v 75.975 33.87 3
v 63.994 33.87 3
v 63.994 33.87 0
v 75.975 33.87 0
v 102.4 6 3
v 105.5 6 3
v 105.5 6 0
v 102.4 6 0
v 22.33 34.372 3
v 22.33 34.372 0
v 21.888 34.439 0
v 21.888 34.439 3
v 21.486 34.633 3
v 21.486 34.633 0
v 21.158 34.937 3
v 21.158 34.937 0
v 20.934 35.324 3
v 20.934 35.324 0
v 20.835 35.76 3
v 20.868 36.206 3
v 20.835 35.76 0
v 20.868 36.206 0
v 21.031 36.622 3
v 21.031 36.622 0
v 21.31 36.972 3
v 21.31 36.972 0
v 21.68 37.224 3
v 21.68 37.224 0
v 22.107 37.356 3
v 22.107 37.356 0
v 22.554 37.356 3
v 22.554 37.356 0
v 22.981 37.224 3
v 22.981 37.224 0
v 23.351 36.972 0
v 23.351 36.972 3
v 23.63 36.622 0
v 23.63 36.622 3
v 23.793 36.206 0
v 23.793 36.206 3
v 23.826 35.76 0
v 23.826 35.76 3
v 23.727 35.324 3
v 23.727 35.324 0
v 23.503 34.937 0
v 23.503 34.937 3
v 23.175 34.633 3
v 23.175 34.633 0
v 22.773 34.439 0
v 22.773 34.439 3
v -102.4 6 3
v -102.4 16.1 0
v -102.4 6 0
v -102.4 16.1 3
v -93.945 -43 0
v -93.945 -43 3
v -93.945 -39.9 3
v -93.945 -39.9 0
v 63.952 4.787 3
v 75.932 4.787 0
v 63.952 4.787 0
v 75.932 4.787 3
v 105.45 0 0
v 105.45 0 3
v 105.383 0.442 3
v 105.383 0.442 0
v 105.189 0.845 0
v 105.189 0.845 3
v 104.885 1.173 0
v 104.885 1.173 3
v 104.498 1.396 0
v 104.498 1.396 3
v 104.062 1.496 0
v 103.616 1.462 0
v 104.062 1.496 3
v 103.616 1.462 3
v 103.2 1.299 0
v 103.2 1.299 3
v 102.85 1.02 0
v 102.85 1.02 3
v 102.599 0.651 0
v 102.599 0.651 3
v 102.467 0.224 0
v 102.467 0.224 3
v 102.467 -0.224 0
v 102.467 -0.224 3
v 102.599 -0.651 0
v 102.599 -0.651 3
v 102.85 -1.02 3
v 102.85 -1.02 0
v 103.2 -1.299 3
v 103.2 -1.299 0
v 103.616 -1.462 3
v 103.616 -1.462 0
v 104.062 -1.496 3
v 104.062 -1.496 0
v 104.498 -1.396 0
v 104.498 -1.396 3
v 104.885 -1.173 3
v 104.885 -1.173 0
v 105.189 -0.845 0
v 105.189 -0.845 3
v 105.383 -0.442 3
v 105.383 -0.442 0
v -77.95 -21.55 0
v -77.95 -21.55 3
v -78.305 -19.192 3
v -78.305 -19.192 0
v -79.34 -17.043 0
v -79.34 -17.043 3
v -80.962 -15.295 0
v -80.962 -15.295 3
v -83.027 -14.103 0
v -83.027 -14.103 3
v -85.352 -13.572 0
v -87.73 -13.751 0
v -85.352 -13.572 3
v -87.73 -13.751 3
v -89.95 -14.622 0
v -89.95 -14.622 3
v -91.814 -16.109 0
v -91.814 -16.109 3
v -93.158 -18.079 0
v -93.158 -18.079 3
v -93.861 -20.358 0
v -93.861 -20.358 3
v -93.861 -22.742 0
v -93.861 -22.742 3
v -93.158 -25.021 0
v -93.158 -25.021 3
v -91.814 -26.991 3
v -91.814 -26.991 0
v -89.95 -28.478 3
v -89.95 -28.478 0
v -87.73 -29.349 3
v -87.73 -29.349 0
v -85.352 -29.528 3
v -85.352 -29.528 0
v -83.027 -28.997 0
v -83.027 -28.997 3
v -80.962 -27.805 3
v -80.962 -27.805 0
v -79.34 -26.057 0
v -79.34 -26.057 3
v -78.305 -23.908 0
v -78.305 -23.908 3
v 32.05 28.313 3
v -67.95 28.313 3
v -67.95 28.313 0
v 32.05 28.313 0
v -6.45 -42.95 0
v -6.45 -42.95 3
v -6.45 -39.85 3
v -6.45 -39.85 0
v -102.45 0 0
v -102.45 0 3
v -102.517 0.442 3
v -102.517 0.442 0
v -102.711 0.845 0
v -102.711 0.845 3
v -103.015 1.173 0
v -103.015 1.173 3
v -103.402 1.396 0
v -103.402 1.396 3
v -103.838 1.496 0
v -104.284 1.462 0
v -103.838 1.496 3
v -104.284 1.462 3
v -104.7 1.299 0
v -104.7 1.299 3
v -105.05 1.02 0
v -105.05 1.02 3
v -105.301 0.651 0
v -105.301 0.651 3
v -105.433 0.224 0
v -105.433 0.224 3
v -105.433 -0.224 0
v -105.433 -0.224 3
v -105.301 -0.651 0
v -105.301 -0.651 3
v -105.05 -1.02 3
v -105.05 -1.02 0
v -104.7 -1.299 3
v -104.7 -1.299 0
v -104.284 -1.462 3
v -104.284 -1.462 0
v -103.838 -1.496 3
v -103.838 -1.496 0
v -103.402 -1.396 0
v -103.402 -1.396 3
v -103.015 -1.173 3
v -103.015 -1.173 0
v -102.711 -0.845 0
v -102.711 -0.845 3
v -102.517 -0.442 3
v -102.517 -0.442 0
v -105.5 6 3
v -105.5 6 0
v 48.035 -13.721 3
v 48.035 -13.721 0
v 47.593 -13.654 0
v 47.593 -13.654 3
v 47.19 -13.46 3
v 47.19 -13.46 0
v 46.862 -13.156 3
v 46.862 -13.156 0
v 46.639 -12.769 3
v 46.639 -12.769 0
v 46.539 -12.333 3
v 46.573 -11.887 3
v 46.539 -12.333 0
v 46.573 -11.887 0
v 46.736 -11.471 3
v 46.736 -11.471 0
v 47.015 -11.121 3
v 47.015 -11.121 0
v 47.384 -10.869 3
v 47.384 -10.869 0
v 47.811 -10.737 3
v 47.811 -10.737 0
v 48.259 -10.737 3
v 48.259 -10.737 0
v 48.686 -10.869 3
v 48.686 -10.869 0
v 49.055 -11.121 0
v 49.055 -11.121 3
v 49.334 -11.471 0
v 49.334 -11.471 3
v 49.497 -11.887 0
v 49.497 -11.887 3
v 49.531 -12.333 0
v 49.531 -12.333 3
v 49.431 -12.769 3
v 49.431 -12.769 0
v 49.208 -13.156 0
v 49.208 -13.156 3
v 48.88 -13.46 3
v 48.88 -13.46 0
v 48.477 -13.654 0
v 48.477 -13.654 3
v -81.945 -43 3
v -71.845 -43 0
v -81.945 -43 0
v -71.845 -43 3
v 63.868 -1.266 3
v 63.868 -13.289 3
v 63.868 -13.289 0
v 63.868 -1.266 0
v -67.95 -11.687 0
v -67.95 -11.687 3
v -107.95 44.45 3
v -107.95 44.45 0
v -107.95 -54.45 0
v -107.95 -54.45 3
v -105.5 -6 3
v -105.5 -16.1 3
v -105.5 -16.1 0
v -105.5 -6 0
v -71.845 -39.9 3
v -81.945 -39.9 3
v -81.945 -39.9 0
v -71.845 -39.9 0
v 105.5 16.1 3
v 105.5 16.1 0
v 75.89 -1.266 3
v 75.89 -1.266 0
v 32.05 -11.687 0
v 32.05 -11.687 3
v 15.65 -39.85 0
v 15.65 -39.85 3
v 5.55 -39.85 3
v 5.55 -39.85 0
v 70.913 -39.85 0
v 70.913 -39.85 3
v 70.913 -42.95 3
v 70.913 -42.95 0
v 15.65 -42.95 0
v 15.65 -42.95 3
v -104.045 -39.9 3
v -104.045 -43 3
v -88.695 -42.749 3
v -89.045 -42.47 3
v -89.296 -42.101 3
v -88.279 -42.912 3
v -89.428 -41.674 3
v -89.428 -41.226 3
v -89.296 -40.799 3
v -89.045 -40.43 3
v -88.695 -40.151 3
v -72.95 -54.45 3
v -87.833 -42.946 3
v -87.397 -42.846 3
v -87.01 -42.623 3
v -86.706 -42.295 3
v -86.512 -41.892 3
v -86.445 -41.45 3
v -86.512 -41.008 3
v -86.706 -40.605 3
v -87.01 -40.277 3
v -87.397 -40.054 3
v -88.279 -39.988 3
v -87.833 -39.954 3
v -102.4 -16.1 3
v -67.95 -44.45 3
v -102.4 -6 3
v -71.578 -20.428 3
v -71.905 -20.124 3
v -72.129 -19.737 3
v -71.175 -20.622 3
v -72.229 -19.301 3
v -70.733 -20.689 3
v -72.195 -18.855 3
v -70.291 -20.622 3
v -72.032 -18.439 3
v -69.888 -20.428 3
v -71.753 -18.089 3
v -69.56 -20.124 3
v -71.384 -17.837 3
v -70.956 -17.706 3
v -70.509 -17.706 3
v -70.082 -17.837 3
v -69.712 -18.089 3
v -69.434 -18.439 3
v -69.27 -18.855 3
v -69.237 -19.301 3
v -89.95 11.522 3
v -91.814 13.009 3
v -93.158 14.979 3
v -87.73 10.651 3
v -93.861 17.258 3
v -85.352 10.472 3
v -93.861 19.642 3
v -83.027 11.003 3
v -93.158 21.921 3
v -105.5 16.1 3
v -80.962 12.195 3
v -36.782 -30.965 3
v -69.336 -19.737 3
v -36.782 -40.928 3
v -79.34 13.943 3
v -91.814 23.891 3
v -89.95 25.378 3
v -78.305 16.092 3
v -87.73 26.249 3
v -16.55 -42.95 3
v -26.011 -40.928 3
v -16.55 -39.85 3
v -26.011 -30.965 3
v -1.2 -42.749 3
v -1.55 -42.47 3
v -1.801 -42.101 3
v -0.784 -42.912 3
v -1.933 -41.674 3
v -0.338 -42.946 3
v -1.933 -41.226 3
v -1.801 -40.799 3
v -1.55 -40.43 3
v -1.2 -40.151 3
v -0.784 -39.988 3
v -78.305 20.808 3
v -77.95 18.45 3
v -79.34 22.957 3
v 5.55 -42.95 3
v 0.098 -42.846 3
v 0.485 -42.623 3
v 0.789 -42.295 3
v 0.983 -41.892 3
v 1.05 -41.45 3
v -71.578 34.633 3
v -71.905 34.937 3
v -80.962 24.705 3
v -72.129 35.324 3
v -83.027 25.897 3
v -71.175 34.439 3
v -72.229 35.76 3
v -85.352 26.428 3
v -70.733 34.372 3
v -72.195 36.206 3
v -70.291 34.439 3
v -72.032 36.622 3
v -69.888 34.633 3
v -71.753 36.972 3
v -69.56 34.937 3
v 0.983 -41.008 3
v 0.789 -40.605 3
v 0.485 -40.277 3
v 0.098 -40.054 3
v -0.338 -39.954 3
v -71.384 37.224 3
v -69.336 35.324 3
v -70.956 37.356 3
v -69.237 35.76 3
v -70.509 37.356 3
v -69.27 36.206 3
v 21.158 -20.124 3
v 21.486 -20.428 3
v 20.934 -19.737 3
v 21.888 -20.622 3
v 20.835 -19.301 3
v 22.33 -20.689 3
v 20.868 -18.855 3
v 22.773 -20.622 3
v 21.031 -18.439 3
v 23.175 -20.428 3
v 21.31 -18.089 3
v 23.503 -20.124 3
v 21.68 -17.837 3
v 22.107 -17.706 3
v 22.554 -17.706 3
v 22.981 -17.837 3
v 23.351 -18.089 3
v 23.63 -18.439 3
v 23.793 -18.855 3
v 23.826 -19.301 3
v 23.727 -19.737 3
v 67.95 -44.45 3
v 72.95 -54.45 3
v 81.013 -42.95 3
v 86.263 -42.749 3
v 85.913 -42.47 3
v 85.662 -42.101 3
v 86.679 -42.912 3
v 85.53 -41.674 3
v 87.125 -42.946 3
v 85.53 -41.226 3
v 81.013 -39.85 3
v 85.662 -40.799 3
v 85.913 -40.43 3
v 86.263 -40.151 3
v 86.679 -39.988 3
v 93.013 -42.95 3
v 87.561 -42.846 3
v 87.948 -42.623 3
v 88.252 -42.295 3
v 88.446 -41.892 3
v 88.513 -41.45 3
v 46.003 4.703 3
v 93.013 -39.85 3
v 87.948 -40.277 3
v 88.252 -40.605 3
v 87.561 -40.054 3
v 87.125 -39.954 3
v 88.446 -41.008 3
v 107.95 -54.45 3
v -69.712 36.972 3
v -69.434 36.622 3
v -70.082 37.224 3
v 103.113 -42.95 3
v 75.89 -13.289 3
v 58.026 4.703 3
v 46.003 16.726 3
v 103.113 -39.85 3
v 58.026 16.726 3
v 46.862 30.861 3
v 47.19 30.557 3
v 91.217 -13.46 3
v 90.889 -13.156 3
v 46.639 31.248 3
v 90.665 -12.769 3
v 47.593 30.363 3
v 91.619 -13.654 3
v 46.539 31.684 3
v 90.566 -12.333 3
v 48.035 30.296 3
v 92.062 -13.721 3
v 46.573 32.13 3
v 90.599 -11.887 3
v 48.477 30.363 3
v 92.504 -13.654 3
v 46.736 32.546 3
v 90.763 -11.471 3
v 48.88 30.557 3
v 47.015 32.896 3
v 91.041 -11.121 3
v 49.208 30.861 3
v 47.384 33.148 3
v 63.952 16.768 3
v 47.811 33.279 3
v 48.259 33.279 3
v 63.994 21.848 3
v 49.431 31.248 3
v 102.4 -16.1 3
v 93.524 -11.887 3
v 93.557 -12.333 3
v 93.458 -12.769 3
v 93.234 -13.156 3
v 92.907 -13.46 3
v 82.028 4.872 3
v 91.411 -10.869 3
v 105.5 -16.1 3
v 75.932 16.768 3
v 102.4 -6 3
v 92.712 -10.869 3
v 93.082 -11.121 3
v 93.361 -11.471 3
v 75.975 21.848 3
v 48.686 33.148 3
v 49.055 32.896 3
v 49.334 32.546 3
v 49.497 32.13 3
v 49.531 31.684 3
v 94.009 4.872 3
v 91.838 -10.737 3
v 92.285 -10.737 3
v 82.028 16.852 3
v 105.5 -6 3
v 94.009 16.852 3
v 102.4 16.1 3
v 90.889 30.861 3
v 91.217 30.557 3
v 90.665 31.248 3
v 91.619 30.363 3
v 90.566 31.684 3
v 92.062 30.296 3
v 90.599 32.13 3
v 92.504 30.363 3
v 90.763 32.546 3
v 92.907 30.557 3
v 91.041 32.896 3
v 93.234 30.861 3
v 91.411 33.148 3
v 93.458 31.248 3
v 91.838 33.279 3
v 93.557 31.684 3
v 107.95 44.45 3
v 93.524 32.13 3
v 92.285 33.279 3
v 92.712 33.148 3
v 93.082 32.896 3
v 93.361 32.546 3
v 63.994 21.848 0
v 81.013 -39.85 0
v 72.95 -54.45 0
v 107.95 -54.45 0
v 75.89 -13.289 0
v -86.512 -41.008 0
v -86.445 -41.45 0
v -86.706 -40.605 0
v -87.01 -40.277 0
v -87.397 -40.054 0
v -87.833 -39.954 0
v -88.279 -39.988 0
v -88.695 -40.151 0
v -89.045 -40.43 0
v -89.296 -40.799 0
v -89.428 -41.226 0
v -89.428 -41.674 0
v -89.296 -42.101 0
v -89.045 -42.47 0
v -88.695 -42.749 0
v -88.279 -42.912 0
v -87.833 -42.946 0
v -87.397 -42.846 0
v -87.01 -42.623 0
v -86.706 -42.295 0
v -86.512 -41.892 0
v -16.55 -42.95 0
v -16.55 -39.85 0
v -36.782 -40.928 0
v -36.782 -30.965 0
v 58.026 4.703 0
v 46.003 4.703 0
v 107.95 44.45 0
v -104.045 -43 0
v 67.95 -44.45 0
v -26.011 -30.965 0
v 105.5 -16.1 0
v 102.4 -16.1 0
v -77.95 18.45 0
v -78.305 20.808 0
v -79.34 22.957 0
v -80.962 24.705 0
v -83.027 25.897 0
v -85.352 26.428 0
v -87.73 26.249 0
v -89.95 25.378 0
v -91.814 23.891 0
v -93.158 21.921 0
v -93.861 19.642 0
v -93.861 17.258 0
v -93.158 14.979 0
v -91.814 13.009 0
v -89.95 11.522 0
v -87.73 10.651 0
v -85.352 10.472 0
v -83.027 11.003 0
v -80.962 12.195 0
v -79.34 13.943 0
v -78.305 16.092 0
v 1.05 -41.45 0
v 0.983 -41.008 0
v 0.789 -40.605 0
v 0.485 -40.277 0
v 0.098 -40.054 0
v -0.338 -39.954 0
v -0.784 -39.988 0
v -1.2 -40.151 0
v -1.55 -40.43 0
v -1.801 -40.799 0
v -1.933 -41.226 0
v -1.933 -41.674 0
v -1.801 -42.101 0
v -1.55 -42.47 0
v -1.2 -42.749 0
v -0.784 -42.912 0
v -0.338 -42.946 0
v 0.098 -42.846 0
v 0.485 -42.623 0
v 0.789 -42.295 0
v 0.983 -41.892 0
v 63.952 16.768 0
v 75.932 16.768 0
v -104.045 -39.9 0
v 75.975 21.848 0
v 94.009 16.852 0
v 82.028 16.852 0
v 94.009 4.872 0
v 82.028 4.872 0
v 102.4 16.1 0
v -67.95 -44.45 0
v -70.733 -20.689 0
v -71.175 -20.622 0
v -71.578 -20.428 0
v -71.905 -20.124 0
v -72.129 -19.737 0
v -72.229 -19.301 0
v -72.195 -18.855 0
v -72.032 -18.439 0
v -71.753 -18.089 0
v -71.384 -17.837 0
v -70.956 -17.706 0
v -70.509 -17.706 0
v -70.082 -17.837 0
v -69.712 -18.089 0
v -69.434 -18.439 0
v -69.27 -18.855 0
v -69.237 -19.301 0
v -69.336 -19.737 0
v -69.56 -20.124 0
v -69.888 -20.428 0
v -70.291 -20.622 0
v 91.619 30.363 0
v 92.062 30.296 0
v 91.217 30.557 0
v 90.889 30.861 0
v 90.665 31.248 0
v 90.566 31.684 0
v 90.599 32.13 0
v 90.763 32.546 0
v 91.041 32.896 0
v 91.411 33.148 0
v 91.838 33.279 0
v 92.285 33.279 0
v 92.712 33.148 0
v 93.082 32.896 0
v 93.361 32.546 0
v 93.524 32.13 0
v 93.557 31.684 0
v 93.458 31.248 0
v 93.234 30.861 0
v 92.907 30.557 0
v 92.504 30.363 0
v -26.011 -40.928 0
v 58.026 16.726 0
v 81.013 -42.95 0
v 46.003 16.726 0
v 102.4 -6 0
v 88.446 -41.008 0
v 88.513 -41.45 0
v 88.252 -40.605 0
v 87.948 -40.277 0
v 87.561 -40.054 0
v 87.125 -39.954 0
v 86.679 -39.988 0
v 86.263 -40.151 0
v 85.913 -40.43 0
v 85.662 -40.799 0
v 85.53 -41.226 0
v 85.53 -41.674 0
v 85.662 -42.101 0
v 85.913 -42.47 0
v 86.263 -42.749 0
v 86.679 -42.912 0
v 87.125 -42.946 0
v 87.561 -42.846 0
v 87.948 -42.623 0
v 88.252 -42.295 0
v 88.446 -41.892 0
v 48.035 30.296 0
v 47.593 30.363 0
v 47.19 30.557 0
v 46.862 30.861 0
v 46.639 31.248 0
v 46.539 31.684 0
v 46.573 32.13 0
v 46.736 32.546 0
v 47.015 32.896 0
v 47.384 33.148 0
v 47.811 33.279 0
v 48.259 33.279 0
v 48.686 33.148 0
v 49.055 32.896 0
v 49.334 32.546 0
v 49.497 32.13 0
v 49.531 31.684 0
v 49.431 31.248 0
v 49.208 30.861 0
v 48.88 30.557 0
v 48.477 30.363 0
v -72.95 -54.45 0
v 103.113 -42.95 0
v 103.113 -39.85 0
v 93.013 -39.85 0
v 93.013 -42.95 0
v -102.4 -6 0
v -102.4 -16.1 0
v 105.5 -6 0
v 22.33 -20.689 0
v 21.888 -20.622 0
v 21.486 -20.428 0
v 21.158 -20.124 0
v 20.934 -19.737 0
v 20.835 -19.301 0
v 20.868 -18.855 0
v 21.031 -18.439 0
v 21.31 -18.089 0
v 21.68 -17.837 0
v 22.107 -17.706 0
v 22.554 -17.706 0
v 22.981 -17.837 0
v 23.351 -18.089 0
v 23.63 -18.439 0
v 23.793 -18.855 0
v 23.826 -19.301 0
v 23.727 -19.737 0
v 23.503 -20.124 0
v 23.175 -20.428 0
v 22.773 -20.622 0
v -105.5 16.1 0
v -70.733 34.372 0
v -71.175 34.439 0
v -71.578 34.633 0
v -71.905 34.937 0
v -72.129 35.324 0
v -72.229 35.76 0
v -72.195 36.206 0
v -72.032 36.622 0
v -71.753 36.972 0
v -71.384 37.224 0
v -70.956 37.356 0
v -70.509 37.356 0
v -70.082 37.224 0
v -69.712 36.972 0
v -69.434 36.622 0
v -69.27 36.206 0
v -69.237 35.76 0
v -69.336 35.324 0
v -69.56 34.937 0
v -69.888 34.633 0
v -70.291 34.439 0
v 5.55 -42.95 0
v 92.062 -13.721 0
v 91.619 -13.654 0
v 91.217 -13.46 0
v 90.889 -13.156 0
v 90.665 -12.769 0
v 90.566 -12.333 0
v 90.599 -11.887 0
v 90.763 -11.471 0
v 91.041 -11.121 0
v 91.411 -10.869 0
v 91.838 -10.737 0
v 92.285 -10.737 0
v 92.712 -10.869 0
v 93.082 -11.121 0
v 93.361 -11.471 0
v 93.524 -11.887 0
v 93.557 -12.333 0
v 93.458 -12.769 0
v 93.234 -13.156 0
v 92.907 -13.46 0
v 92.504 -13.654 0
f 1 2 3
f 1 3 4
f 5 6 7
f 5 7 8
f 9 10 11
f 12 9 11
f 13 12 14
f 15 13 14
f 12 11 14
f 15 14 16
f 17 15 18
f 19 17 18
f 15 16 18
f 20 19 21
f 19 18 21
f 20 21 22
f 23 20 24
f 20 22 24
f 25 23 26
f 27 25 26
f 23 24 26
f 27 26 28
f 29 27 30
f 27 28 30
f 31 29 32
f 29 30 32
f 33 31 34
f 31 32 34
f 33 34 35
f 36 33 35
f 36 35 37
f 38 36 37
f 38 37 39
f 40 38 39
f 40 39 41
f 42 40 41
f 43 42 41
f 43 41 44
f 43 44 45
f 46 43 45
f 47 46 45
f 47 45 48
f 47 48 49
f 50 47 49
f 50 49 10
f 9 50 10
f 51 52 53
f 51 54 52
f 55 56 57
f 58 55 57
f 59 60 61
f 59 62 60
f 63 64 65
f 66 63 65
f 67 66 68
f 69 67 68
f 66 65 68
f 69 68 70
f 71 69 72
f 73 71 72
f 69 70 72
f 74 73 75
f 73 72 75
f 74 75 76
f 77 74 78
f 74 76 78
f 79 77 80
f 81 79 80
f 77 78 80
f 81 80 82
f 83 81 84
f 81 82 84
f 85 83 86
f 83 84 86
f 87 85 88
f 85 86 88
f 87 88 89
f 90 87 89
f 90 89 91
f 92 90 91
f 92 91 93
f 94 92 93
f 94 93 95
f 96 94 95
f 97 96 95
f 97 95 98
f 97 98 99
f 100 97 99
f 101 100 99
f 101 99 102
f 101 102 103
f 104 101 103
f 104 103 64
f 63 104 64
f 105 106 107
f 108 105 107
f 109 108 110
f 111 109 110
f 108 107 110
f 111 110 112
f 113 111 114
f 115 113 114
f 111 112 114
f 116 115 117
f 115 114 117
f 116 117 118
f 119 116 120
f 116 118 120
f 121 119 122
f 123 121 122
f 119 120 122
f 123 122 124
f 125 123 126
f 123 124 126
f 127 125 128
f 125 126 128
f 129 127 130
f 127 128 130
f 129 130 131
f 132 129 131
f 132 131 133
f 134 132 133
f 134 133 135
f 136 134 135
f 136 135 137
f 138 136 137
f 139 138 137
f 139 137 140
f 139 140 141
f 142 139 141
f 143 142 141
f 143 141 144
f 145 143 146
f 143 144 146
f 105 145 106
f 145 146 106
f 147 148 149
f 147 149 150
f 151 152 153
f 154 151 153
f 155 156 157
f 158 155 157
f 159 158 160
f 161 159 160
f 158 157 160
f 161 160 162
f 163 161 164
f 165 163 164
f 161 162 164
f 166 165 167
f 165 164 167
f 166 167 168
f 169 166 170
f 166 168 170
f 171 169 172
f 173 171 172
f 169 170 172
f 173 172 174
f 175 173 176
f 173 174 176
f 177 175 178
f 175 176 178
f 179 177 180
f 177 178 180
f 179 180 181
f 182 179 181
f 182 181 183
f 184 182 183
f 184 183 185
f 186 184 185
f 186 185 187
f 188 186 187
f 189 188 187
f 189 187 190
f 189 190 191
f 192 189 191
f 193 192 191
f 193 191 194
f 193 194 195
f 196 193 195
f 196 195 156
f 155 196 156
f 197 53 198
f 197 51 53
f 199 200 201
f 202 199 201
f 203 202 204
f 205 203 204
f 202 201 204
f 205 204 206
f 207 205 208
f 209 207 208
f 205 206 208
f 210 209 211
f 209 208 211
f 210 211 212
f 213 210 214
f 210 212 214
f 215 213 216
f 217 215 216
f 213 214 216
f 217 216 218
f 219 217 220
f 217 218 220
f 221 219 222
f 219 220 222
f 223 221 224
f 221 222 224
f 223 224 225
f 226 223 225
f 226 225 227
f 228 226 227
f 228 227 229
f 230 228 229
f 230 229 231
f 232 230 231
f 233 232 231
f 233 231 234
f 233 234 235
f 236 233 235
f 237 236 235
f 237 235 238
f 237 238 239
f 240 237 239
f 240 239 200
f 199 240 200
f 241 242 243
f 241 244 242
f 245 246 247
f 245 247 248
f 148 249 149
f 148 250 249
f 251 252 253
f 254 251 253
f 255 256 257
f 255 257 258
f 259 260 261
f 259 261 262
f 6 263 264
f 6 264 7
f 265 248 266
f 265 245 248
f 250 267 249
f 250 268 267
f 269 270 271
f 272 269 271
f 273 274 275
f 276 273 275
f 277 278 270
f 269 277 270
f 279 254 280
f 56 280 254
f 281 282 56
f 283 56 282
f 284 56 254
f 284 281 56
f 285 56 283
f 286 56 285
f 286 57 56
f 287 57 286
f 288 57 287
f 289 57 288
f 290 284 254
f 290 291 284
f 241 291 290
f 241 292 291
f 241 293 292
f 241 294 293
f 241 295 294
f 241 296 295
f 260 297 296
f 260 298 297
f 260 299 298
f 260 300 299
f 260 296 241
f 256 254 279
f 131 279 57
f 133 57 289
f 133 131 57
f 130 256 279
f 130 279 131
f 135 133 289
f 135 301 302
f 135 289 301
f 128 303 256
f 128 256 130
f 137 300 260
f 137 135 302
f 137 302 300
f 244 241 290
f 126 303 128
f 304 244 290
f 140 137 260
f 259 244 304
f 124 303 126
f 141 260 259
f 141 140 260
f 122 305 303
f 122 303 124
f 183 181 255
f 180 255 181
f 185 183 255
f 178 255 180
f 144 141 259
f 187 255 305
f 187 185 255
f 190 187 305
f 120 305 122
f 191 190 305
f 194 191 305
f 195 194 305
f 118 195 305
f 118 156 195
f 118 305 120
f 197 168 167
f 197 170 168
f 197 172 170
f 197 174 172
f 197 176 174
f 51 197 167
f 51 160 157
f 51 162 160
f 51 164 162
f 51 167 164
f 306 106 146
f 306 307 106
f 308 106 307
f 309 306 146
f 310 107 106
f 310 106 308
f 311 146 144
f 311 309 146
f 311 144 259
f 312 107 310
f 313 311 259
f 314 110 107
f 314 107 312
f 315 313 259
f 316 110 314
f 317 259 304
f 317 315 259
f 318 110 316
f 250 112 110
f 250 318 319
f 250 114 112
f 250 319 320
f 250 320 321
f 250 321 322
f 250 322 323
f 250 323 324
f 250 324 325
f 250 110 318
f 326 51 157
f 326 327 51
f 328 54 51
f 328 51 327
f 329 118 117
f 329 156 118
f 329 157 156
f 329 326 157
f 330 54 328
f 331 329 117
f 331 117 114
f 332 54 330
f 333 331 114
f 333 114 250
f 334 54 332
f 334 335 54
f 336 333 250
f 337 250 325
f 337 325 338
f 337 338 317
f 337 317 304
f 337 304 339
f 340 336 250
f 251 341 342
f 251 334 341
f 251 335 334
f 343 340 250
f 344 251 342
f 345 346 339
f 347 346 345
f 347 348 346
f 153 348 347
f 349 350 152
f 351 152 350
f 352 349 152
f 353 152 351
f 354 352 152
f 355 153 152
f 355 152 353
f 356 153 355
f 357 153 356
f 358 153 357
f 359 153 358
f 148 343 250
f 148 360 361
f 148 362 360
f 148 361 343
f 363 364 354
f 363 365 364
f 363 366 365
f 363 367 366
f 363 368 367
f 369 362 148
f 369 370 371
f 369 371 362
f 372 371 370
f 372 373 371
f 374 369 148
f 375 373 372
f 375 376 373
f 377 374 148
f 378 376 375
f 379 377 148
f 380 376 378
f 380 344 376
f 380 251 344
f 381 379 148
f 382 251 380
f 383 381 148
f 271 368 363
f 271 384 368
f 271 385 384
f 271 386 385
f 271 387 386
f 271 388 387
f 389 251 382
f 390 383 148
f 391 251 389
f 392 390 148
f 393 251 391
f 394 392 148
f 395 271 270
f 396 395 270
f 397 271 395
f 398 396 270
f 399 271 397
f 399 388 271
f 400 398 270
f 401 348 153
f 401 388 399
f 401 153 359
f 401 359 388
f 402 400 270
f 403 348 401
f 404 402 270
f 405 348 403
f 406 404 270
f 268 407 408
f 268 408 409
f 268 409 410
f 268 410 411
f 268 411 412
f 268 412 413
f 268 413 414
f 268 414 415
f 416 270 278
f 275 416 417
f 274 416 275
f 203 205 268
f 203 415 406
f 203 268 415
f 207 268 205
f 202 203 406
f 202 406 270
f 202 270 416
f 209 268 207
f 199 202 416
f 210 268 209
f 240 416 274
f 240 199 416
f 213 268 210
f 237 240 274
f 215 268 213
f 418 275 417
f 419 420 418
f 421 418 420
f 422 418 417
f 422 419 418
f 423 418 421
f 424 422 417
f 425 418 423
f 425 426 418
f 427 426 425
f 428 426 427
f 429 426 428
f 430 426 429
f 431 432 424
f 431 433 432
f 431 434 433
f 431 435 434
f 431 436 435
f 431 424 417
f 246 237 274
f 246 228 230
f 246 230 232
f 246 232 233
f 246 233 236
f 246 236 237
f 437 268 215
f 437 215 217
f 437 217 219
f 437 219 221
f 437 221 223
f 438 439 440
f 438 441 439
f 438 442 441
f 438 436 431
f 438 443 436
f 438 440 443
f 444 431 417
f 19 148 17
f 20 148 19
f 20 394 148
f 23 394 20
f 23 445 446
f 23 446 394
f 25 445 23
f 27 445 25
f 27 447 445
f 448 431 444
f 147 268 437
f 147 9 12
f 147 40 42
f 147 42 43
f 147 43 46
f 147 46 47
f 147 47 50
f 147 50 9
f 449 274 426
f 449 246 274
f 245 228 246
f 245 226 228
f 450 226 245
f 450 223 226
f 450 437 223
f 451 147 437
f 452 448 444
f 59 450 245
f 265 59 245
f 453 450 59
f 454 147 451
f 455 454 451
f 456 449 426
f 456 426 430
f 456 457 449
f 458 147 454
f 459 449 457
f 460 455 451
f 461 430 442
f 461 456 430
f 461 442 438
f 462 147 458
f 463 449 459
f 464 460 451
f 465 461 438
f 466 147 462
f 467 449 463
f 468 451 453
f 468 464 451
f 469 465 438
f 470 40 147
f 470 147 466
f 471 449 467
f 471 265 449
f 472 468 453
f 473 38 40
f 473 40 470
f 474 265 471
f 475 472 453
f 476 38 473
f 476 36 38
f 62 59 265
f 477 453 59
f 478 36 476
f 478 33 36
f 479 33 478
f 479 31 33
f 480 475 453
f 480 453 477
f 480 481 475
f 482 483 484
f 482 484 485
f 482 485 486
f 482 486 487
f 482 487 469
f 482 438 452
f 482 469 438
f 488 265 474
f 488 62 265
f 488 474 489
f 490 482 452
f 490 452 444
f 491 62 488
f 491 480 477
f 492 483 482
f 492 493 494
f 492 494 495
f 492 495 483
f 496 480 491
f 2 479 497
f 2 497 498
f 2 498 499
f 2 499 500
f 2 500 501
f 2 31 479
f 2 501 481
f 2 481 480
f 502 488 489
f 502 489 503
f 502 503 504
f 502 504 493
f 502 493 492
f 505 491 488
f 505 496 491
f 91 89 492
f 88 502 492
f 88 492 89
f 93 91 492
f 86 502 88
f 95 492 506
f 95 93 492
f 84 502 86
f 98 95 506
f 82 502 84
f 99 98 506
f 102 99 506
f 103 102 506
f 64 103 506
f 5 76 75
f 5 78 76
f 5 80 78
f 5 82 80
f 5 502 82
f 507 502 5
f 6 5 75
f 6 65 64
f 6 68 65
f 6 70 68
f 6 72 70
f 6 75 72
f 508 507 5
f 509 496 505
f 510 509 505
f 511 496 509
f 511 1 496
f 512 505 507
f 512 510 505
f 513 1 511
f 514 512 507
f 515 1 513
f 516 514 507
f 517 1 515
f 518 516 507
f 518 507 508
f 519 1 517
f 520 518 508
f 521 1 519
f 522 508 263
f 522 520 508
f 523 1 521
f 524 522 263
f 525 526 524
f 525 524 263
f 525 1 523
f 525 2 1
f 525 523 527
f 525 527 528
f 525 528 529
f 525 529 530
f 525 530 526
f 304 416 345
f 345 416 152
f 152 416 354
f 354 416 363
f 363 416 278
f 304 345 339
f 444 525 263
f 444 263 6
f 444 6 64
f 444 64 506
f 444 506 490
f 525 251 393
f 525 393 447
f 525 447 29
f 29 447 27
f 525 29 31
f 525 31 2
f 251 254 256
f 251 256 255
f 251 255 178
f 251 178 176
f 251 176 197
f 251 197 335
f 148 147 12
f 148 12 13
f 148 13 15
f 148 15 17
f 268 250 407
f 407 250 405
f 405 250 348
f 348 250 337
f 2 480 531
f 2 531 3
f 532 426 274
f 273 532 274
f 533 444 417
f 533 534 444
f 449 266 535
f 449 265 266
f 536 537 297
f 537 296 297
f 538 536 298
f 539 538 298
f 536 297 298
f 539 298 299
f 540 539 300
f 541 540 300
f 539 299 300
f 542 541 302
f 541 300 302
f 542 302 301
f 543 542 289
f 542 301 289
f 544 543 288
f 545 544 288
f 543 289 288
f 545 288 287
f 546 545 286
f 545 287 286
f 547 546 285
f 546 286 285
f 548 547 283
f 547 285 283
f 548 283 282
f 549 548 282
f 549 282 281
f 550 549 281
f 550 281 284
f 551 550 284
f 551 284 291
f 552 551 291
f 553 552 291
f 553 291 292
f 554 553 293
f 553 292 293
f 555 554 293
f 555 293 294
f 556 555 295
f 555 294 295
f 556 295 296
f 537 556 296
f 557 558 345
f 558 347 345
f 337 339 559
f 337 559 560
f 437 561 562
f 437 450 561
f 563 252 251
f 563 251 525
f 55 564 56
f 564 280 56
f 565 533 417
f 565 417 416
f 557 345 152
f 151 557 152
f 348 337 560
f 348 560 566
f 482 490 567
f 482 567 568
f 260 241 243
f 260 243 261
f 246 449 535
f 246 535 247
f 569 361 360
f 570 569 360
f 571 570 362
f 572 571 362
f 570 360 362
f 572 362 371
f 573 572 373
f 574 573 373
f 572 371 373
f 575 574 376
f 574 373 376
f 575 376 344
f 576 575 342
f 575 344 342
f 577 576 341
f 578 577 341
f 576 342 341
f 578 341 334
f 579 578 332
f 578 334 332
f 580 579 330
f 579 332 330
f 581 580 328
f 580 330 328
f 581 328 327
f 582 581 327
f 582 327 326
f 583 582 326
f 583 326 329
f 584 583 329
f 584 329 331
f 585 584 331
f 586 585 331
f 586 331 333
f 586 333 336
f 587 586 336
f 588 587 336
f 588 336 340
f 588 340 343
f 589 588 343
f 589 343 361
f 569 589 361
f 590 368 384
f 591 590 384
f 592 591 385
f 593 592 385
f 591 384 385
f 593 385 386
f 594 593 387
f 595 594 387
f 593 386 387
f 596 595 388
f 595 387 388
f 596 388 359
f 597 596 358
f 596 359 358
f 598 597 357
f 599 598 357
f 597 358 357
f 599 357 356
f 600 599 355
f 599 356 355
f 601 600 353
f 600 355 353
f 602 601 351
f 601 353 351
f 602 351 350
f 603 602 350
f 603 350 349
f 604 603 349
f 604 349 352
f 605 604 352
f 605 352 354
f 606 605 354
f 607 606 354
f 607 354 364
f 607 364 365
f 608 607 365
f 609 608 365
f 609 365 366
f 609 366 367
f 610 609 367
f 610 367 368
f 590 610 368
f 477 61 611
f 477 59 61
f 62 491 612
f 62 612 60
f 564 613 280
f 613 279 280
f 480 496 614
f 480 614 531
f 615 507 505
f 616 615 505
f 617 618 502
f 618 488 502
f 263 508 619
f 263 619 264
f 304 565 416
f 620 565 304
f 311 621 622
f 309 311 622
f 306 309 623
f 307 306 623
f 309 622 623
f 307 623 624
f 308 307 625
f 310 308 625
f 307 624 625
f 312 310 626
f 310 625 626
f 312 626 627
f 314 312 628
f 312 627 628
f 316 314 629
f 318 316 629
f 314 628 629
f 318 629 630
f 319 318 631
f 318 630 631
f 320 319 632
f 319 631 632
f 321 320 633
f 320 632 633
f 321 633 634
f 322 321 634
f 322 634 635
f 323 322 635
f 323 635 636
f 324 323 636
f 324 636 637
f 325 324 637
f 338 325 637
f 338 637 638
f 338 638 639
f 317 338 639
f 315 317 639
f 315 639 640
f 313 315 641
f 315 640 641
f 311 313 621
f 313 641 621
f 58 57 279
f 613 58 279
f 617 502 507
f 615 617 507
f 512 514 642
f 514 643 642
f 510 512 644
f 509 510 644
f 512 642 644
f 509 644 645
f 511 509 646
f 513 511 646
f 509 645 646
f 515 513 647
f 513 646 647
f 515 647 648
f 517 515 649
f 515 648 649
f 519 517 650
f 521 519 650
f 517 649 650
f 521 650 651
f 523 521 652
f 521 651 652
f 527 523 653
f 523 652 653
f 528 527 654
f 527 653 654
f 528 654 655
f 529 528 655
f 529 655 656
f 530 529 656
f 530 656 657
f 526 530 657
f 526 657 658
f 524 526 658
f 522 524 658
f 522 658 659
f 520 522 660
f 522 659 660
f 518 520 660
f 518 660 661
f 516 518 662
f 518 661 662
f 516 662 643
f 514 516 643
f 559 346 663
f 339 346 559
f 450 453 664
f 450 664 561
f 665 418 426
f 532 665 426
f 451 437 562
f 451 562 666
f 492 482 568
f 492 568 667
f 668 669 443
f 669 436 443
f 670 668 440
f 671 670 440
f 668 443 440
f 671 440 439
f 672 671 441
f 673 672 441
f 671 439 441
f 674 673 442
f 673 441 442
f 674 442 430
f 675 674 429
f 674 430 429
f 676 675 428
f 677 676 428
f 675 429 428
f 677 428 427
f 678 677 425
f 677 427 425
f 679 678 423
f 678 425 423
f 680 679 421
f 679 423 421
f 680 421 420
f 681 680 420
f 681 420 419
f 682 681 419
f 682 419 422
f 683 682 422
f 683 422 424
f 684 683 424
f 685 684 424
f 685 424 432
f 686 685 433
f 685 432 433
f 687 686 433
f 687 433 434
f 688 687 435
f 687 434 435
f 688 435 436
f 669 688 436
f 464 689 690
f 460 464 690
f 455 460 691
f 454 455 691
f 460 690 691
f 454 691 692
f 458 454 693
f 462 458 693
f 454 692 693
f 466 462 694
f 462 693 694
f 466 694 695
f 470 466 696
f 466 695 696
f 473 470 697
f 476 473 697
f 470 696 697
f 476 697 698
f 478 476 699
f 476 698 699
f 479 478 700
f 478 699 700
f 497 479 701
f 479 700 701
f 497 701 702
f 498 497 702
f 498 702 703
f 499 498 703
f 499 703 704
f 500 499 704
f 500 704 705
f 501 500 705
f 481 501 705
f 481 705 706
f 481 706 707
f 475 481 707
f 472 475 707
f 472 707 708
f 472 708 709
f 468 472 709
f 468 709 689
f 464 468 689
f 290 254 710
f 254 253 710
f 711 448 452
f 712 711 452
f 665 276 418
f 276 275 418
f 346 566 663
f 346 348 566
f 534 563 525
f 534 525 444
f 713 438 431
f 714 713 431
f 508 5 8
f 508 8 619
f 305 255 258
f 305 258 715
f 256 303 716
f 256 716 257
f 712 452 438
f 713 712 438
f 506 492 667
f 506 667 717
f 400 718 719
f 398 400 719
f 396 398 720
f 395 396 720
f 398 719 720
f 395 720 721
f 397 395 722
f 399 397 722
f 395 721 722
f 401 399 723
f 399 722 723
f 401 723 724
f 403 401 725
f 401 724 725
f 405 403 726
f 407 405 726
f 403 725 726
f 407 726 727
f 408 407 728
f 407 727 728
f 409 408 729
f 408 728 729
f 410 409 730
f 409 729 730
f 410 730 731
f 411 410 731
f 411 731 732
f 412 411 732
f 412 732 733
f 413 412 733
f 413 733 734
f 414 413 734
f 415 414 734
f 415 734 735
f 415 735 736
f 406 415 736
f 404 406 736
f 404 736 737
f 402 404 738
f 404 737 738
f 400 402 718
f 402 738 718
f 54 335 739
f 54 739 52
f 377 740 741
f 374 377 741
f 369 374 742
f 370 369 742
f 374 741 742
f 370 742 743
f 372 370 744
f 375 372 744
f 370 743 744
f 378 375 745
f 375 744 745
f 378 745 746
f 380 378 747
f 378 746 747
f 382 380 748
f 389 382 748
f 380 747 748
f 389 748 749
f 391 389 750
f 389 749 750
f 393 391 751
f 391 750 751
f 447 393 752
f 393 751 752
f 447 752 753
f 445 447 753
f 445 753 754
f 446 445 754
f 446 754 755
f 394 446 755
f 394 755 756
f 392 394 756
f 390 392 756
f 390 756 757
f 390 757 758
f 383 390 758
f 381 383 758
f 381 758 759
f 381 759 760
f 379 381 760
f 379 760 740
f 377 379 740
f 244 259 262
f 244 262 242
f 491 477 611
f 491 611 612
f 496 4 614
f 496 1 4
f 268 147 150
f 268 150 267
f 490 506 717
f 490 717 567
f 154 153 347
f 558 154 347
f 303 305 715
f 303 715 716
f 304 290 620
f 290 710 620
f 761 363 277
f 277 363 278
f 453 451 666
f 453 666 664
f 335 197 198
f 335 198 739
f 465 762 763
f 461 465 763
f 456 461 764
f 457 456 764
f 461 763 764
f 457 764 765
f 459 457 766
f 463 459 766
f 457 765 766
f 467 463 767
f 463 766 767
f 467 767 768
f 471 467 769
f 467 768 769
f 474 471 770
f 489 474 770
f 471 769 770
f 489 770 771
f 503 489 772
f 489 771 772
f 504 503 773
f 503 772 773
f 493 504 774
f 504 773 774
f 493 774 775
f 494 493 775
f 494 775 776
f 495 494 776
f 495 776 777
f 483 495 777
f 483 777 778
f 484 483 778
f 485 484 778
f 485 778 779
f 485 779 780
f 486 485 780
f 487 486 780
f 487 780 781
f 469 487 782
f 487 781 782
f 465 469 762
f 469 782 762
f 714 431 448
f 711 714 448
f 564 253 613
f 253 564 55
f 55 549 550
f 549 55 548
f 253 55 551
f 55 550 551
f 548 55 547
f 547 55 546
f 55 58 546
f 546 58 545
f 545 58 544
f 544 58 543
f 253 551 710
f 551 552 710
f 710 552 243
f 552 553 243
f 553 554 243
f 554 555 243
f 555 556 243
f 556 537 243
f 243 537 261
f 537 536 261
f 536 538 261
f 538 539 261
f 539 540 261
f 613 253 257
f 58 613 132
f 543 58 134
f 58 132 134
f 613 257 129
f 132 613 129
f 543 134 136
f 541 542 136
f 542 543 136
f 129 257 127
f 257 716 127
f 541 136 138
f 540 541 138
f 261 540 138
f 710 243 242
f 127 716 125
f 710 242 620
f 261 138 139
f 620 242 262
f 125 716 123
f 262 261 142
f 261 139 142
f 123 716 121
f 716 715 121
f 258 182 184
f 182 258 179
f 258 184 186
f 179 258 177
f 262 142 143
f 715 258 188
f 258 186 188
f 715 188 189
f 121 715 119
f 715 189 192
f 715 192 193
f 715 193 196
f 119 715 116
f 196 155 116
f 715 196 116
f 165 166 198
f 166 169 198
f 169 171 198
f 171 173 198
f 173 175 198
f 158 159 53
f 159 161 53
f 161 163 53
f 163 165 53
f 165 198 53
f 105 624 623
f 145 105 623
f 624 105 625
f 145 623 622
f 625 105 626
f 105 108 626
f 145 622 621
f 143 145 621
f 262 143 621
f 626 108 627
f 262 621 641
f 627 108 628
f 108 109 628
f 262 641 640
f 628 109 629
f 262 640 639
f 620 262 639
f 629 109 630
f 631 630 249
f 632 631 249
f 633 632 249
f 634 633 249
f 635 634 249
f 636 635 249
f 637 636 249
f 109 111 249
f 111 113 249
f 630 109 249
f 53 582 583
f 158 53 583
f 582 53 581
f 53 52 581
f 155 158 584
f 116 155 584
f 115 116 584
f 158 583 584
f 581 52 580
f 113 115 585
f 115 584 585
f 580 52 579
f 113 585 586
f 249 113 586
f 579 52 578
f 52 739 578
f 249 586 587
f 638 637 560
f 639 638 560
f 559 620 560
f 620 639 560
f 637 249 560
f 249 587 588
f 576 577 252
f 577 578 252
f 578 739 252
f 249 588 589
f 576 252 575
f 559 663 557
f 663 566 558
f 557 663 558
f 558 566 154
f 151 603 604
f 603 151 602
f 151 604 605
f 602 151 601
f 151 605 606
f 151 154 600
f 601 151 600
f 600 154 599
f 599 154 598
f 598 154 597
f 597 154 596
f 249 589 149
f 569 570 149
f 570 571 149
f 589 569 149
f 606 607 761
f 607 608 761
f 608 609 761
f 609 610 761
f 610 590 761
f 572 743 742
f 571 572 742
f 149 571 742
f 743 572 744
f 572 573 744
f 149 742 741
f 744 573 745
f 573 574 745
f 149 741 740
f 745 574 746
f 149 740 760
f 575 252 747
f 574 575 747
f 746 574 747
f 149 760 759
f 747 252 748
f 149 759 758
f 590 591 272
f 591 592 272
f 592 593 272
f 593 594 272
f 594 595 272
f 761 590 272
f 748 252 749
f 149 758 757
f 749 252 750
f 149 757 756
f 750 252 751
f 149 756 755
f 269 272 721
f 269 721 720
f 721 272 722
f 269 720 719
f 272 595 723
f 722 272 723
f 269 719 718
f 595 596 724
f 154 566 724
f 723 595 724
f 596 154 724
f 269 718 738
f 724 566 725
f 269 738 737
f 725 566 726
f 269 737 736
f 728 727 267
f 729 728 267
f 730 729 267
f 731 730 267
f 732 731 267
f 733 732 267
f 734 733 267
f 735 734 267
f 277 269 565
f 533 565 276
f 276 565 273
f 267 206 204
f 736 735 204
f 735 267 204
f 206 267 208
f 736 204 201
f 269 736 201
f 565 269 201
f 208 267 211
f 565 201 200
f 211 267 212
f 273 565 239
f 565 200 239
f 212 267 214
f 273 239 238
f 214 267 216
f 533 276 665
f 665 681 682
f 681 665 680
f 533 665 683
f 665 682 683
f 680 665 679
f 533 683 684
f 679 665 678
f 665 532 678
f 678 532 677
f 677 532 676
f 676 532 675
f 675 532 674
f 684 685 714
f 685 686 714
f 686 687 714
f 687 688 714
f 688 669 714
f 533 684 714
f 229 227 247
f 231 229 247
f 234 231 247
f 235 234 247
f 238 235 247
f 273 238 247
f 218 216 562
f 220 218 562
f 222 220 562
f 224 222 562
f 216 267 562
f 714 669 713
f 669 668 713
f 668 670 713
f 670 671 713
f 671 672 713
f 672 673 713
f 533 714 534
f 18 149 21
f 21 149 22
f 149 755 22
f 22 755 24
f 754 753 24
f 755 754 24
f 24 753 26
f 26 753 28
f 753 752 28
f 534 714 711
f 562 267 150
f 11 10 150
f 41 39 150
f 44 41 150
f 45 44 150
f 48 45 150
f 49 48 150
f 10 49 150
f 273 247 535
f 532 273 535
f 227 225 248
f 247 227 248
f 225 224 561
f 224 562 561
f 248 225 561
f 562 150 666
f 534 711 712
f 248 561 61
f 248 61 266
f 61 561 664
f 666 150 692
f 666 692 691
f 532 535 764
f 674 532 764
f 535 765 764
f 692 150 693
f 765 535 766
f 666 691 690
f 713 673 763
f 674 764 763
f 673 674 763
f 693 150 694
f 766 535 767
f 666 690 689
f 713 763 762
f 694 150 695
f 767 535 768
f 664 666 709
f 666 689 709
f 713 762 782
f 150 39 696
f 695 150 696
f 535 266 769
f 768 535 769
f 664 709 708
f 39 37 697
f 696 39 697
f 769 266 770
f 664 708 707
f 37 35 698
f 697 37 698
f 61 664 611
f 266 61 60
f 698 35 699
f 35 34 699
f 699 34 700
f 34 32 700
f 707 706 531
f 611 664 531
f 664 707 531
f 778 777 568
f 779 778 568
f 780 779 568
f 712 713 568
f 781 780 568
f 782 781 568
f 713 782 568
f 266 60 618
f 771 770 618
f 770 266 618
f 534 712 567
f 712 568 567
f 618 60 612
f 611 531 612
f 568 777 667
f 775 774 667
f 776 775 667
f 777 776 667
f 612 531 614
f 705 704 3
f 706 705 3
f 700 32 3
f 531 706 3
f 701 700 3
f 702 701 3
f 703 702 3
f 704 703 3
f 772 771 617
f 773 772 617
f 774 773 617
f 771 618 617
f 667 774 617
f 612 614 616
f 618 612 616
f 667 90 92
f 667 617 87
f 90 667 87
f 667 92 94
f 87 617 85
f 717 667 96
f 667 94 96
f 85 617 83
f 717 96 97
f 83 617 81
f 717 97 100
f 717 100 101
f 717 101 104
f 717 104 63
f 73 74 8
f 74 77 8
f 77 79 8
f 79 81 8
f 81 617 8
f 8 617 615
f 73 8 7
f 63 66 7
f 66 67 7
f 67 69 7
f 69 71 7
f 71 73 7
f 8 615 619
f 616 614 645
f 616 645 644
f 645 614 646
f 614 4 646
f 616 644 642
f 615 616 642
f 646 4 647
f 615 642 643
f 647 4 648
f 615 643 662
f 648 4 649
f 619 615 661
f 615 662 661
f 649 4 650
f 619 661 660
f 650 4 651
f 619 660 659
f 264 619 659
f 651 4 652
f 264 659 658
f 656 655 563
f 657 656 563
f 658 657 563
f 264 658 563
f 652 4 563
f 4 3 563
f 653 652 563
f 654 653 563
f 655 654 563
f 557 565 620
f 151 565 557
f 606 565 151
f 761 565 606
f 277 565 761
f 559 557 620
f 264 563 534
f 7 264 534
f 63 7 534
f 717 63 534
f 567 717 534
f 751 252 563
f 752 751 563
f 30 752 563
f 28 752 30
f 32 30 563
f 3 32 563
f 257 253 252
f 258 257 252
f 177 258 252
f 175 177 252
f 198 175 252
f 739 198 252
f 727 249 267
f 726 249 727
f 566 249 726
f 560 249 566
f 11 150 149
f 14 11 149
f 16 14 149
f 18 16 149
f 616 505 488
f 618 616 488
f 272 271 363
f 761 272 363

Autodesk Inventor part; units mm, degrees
ref_plane "YZ Plane" through (0, 0, 0) normal (1, 0, 0) x (0, 1, 0)
ref_plane "XZ Plane" through (0, 0, 0) normal (0, 1, 0) x (-1, 0, 0)
ref_plane "XY Plane" through (0, 0, 0) normal (0, 0, 1) x (1, 0, 0)
sketch "Sketch1" plane through (0, 0, 0) normal (0, 0, 1) x (1, 0, 0)
  line L0 (-107.95, 44.45) -> (107.95, 44.45)
  line L1 (-107.95, -54.45) -> (-72.95, -54.45)
  line L2 (-72.95, -54.45) -> (-67.95, -44.45)
  line L3 (67.95, -44.45) -> (-67.95, -44.45)
  line L4 (107.95, -54.45) -> (72.95, -54.45)
  line L5 (72.95, -54.45) -> (67.95, -44.45)
  line L6 (-107.95, 44.45) -> (-107.95, -54.45)
  line L7 (107.95, 44.45) -> (107.95, -54.45)
  point P0 (0, 0)
  dimension "d36" = 88.9
  dimension "d38" = 215.9
  dimension "d39" = 44.45
  dimension "d40" = 107.95
  dimension "d41" = 98.9
  dimension "d42" = 10
  dimension "d43" = 116.565
  dimension "d44" = 35
  dimension "d45" = 35
  dimension "d46" = 116.565
  dimension "d47" = 40
extrude "Face ext" add sketch "Sketch1" along normal blind 3
sketch "Cutouts - skt" plane through (0, 0, 3) normal (0, 0, 1) x (1, 0, 0)
  line L0 (107.95, 44.45) -> (-107.95, 44.45) projected
  line L1 (63.8676, -13.289) -> (63.8676, -1.2663)
  line L2 (75.89, -13.289) -> (63.8676, -13.289)
  line L3 (75.89, -1.2663) -> (75.89, -13.289)
  line L4 (63.8676, -1.2663) -> (75.89, -1.2663)
  line L5 (46.0028, 16.7255) -> (58.0255, 16.7255)
  line L6 (46.0028, 4.7026) -> (46.0028, 16.7255)
  line L7 (58.0255, 4.7026) -> (46.0028, 4.7026)
  line L8 (58.0255, 16.7255) -> (58.0255, 4.7026)
  line L9 (75.9748, 33.8704) -> (75.9748, 21.8478)
  line L10 (63.9944, 33.8704) -> (75.9748, 33.8704)
  line L11 (63.9944, 21.8478) -> (63.9944, 33.8704)
  line L12 (75.9748, 21.8478) -> (63.9944, 21.8478)
  line L13 (63.9521, 16.7677) -> (75.9324, 16.7677)
  line L14 (63.9521, 4.7874) -> (63.9521, 16.7677)
  line L15 (75.9324, 4.7874) -> (63.9521, 4.7874)
  line L16 (75.9324, 16.7677) -> (75.9324, 4.7874)
  line L17 (94.0088, 4.8721) -> (94.0088, 16.8525)
  line L18 (82.0285, 4.8721) -> (94.0088, 4.8721)
  line L19 (82.0285, 16.8525) -> (82.0285, 4.8721)
  line L20 (94.0088, 16.8525) -> (82.0285, 16.8525)
  line L21 (27.7989, -11.6866) -> (-67.95, -11.6866)
  line L22 (-67.95, 28.3134) -> (25.7989, 28.3134)
  line L23 (32.0499, 28.3134) -> (32.0499, -11.6866)
  circle A0 centre (-85.95, 18.45) radius 8
  circle A1 centre (-85.95, -21.55) radius 8
  line L24 (-67.95, 28.3134) -> (32.0499, 28.3134)
  line L25 (32.0499, 28.3134) -> (32.0499, -11.6866)
  line L26 (32.0499, -11.6866) -> (-67.95, -11.6866)
  line L27 (-67.95, -11.6866) -> (-67.95, 28.3134)
  line L28 (63.9944, 33.8704) -> (75.9748, 33.8704)
  line L29 (75.9748, 33.8704) -> (75.9748, 21.8478)
  line L30 (75.9748, 21.8478) -> (63.9944, 21.8478)
  line L31 (63.9944, 21.8478) -> (63.9944, 33.8704)
  line L32 (82.0285, 16.8525) -> (94.0088, 16.8525)
  line L33 (94.0088, 16.8525) -> (94.0088, 4.8721)
  line L34 (94.0088, 4.8721) -> (82.0285, 4.8721)
  line L35 (82.0285, 4.8721) -> (82.0285, 16.8525)
  line L36 (63.9521, 16.7677) -> (75.9324, 16.7677)
  line L37 (75.9324, 16.7677) -> (75.9324, 4.7874)
  line L38 (75.9324, 4.7874) -> (63.9521, 4.7874)
  line L39 (63.9521, 4.7874) -> (63.9521, 16.7677)
  line L40 (46.0028, 16.7255) -> (58.0255, 16.7255)
  line L41 (58.0255, 16.7255) -> (58.0255, 4.7026)
  line L42 (58.0255, 4.7026) -> (46.0028, 4.7026)
  line L43 (46.0028, 4.7026) -> (46.0028, 16.7255)
  line L44 (63.8676, -1.2663) -> (75.89, -1.2663)
  line L45 (75.89, -1.2663) -> (75.89, -13.289)
  line L46 (75.89, -13.289) -> (63.8676, -13.289)
  line L47 (63.8676, -13.289) -> (63.8676, -1.2663)
  line L48 (-36.7815, -30.9654) -> (-26.011, -30.9654)
  line L49 (-26.011, -30.9654) -> (-26.011, -40.9281)
  line L50 (-26.011, -40.9281) -> (-36.7815, -40.9281)
  line L51 (-36.7815, -40.9281) -> (-36.7815, -30.9654)
  line L52 (-16.5867, -34.4658) -> (45.1738, -34.4658) construction
  line L53 (45.1738, -34.4658) -> (45.1738, -38.1955) construction
  line L54 (45.1738, -38.1955) -> (-16.5867, -38.1955) construction
  line L55 (-16.5867, -38.1955) -> (-16.5867, -34.4658) construction
  line L56 (-107.95, 44.45) -> (-107.95, -54.45) projected
  point P0 (-107.95, -44.45)
  point P1 (0, 0)
  point P2 (-70.7327, 35.8725)
  point P3 (22.3305, 35.8725)
  point P4 (22.3305, -19.1888)
  point P5 (-70.7327, -19.1888)
  point P6 (48.035, 31.7962)
  point P7 (92.0616, 31.7962)
  point P8 (48.035, -12.2207)
  point P9 (92.0616, -12.2207)
  point P10 (48.035, 31.7962)
  point P11 (92.0616, 31.7962)
  point P12 (92.0616, -12.2207)
  point P13 (48.035, -12.2207)
  point P14 (-70.7327, 35.8725)
  point P15 (22.3305, 35.8725)
  point P16 (22.3305, -19.1888)
  point P17 (-70.7327, -19.1888)
  dimension "d8" = 16
  dimension "d9" = 16
  dimension "d13" = 26
  dimension "d48" = 40
  dimension "d49" = 99.9999
  dimension "d50" = 40
  dimension "d51" = 93.0632
  dimension "d52" = 93.0632
  dimension "d53" = 55.0612
  dimension "d54" = 55.0612
  dimension "d55" = 8.5775
  dimension "d57" = 7.5591
  dimension "d59" = 44.0266
  dimension "d60" = 44.0266
  dimension "d61" = 22
  dimension "d62" = 22
  dimension "d90" = 40
  dimension "d91" = 18
sketch3d "3D Sketch1"
extrude "Cut-outs ext" cut sketch "Cutouts - skt" against normal through all
hole "Hole1" at (-70.7327, 35.8725, 3) at (-70.7327, -19.1888, 3) at (22.3305, -19.1888, 3) at (22.3305, 35.8725, 3) at (48.035, -12.2207, 3) at (48.035, 31.7962, 3) at (92.0616, 31.7962, 3) at (92.0616, -12.2207, 3) direction (0, 0, -1) diameter 3 end through all
sketch "Mating Holes" plane through (0, 0, 3) normal (0, 0, 1) x (1, 0, 0)
  line L0 (107.95, 44.45) -> (-107.95, 44.45) projected
  line L1 (-107.95, 44.45) -> (-107.95, -54.45) projected
  line L2 (-67.95, -44.45) -> (67.95, -44.45) projected
  line L3 (107.95, -54.45) -> (107.95, 44.45) projected
  circle A0 centre (-103.95, 0) radius 1.5
  line L4 (-105.5, -6) -> (-102.4, -6)
  line L5 (-102.4, -6) -> (-102.4, -16.1)
  line L6 (-102.4, -16.1) -> (-105.5, -16.1)
  line L7 (-105.5, -16.1) -> (-105.5, -6)
  line L8 (-105.5, 16.0999) -> (-102.4, 16.0999)
  line L9 (-102.4, 16.0999) -> (-102.4, 5.9999)
  line L10 (-102.4, 5.9999) -> (-105.5, 5.9999)
  line L11 (-105.5, 5.9999) -> (-105.5, 16.0999)
  circle A1 centre (103.95, 0) radius 1.5
  line L12 (102.4, -6) -> (105.5, -6)
  line L13 (105.5, -6) -> (105.5, -16.1)
  line L14 (105.5, -16.1) -> (102.4, -16.1)
  line L15 (102.4, -16.1) -> (102.4, -6)
  line L16 (102.4, 16.0999) -> (105.5, 16.0999)
  line L17 (105.5, 16.0999) -> (105.5, 5.9999)
  line L18 (105.5, 5.9999) -> (102.4, 5.9999)
  line L19 (102.4, 5.9999) -> (102.4, 16.0999)
  point P0 (0, 0)
  dimension "d63" = 3
  dimension "d75" = 44.45
  dimension "d79" = 3.1
  dimension "d80" = 10.1
  dimension "d81" = 6
  dimension "d85" = 3.1
  dimension "d86" = 10.1
  dimension "d87" = 5.9999
  dimension "d88" = 1.55
  dimension "d89" = 1.55
  dimension "d92" = 3
  dimension "d93" = 3.1
  dimension "d94" = 10.1
  dimension "d95" = 6
  dimension "d96" = 3.1
  dimension "d97" = 10.1
  dimension "d98" = 5.9999
  dimension "d99" = 1.55
  dimension "d100" = 1.55
  dimension "d101" = 4
  dimension "d102" = 44.45
  dimension "d103" = 4
  dimension "d104" = 88.9
extrude "Side Panel Slots" cut sketch "Mating Holes" against normal through all
sketch "Bottom Panel Slots" plane through (0, 0, 3) normal (0, 0, 1) x (1, 0, 0)
  line L0 (-107.95, 44.45) -> (-107.95, -54.45) projected
  line L1 (-107.95, -54.45) -> (-72.95, -54.45) projected
  line L2 (72.95, -54.45) -> (107.95, -54.45) projected
  circle A0 centre (-87.945, -41.45) radius 1.5
  line L3 (-93.945, -39.9) -> (-104.045, -39.9)
  line L4 (-104.045, -39.9) -> (-104.045, -43)
  line L5 (-104.045, -43) -> (-93.945, -43)
  line L6 (-93.945, -43) -> (-93.945, -39.9)
  line L7 (-81.945, -39.9) -> (-71.845, -39.9)
  line L8 (-71.845, -39.9) -> (-71.845, -43)
  line L9 (-71.845, -43) -> (-81.945, -43)
  line L10 (-81.945, -43) -> (-81.945, -39.9)
  circle A1 centre (87.013, -41.45) radius 1.5
  line L11 (93.013, -42.95) -> (103.113, -42.95)
  line L12 (103.113, -42.95) -> (103.113, -39.85)
  line L13 (103.113, -39.85) -> (93.013, -39.85)
  line L14 (93.013, -39.85) -> (93.013, -42.95)
  line L15 (81.013, -39.85) -> (70.913, -39.85)
  line L16 (70.913, -39.85) -> (70.913, -42.95)
  line L17 (70.913, -42.95) -> (81.013, -42.95)
  line L18 (81.013, -42.95) -> (81.013, -39.85)
  circle A2 centre (-0.45, -41.45) radius 1.5
  line L19 (5.55, -42.95) -> (15.65, -42.95)
  line L20 (15.65, -42.95) -> (15.65, -39.85)
  line L21 (15.65, -39.85) -> (5.55, -39.85)
  line L22 (5.55, -39.85) -> (5.55, -42.95)
  line L23 (-6.45, -39.85) -> (-16.55, -39.85)
  line L24 (-16.55, -39.85) -> (-16.55, -42.95)
  line L25 (-16.55, -42.95) -> (-6.45, -42.95)
  line L26 (-6.45, -42.95) -> (-6.45, -39.85)
  point P0 (0, 0)
  point P1 (-93.945, -41.45)
  point P2 (-71.845, -41.45)
  dimension "d109" = 3
  dimension "d112" = 10.1
  dimension "d113" = 3.1
  dimension "d116" = 13
  dimension "d118" = 10.1
  dimension "d119" = 3.1
  dimension "d120" = 13
  dimension "d123" = 6
  dimension "d124" = 6
  dimension "d125" = 13
  dimension "d129" = 3
  dimension "d130" = 10.1
  dimension "d131" = 3.1
  dimension "d132" = 10.1
  dimension "d133" = 3.1
  dimension "d134" = 6
  dimension "d137" = 6
  dimension "d138" = 13
  dimension "d140" = 1.5
  dimension "d141" = 1.5
  dimension "d142" = 3
  dimension "d143" = 107.5
  dimension "d144" = 13
  dimension "d145" = 10.1
  dimension "d146" = 3.1
  dimension "d147" = 10.1
  dimension "d148" = 3.1
  dimension "d149" = 1.5
  dimension "d150" = 1.5
  dimension "d151" = 6
  dimension "d152" = 6
  dimension "d155" = 87.463
  dimension "d156" = 87.495
extrude "Extrusion4" cut sketch "Bottom Panel Slots" against normal blind 10
equation "\"d39\" = 0.5 * d36"
equation "\"d40\" = 0.5 * d38"
equation "\"d45\" = d44"
equation "\"d46\" = d43"
equation "\"d52\" = d51"
equation "\"d54\" = d53"
equation "\"d60\" = d59"
equation "\"d62\" = d61"
equation "\"d75\" = 0.5 * d104"
equation "\"d79\" = d85"
equation "\"d80\" = d86"
equation "\"d88\" = 0.5 * d85"
equation "\"d89\" = d88"
equation "\"d93\" = d96"
equation "\"d94\" = d97"
equation "\"d99\" = 0.5 * d96"
equation "\"d100\" = d99"
equation "\"d101\" = d84"
equation "\"d102\" = d75"
equation "\"d105\" = d76"
equation "\"d84\" = 4"
equation "\"d76\" = 88.9"
properties part number "Front Panel"
